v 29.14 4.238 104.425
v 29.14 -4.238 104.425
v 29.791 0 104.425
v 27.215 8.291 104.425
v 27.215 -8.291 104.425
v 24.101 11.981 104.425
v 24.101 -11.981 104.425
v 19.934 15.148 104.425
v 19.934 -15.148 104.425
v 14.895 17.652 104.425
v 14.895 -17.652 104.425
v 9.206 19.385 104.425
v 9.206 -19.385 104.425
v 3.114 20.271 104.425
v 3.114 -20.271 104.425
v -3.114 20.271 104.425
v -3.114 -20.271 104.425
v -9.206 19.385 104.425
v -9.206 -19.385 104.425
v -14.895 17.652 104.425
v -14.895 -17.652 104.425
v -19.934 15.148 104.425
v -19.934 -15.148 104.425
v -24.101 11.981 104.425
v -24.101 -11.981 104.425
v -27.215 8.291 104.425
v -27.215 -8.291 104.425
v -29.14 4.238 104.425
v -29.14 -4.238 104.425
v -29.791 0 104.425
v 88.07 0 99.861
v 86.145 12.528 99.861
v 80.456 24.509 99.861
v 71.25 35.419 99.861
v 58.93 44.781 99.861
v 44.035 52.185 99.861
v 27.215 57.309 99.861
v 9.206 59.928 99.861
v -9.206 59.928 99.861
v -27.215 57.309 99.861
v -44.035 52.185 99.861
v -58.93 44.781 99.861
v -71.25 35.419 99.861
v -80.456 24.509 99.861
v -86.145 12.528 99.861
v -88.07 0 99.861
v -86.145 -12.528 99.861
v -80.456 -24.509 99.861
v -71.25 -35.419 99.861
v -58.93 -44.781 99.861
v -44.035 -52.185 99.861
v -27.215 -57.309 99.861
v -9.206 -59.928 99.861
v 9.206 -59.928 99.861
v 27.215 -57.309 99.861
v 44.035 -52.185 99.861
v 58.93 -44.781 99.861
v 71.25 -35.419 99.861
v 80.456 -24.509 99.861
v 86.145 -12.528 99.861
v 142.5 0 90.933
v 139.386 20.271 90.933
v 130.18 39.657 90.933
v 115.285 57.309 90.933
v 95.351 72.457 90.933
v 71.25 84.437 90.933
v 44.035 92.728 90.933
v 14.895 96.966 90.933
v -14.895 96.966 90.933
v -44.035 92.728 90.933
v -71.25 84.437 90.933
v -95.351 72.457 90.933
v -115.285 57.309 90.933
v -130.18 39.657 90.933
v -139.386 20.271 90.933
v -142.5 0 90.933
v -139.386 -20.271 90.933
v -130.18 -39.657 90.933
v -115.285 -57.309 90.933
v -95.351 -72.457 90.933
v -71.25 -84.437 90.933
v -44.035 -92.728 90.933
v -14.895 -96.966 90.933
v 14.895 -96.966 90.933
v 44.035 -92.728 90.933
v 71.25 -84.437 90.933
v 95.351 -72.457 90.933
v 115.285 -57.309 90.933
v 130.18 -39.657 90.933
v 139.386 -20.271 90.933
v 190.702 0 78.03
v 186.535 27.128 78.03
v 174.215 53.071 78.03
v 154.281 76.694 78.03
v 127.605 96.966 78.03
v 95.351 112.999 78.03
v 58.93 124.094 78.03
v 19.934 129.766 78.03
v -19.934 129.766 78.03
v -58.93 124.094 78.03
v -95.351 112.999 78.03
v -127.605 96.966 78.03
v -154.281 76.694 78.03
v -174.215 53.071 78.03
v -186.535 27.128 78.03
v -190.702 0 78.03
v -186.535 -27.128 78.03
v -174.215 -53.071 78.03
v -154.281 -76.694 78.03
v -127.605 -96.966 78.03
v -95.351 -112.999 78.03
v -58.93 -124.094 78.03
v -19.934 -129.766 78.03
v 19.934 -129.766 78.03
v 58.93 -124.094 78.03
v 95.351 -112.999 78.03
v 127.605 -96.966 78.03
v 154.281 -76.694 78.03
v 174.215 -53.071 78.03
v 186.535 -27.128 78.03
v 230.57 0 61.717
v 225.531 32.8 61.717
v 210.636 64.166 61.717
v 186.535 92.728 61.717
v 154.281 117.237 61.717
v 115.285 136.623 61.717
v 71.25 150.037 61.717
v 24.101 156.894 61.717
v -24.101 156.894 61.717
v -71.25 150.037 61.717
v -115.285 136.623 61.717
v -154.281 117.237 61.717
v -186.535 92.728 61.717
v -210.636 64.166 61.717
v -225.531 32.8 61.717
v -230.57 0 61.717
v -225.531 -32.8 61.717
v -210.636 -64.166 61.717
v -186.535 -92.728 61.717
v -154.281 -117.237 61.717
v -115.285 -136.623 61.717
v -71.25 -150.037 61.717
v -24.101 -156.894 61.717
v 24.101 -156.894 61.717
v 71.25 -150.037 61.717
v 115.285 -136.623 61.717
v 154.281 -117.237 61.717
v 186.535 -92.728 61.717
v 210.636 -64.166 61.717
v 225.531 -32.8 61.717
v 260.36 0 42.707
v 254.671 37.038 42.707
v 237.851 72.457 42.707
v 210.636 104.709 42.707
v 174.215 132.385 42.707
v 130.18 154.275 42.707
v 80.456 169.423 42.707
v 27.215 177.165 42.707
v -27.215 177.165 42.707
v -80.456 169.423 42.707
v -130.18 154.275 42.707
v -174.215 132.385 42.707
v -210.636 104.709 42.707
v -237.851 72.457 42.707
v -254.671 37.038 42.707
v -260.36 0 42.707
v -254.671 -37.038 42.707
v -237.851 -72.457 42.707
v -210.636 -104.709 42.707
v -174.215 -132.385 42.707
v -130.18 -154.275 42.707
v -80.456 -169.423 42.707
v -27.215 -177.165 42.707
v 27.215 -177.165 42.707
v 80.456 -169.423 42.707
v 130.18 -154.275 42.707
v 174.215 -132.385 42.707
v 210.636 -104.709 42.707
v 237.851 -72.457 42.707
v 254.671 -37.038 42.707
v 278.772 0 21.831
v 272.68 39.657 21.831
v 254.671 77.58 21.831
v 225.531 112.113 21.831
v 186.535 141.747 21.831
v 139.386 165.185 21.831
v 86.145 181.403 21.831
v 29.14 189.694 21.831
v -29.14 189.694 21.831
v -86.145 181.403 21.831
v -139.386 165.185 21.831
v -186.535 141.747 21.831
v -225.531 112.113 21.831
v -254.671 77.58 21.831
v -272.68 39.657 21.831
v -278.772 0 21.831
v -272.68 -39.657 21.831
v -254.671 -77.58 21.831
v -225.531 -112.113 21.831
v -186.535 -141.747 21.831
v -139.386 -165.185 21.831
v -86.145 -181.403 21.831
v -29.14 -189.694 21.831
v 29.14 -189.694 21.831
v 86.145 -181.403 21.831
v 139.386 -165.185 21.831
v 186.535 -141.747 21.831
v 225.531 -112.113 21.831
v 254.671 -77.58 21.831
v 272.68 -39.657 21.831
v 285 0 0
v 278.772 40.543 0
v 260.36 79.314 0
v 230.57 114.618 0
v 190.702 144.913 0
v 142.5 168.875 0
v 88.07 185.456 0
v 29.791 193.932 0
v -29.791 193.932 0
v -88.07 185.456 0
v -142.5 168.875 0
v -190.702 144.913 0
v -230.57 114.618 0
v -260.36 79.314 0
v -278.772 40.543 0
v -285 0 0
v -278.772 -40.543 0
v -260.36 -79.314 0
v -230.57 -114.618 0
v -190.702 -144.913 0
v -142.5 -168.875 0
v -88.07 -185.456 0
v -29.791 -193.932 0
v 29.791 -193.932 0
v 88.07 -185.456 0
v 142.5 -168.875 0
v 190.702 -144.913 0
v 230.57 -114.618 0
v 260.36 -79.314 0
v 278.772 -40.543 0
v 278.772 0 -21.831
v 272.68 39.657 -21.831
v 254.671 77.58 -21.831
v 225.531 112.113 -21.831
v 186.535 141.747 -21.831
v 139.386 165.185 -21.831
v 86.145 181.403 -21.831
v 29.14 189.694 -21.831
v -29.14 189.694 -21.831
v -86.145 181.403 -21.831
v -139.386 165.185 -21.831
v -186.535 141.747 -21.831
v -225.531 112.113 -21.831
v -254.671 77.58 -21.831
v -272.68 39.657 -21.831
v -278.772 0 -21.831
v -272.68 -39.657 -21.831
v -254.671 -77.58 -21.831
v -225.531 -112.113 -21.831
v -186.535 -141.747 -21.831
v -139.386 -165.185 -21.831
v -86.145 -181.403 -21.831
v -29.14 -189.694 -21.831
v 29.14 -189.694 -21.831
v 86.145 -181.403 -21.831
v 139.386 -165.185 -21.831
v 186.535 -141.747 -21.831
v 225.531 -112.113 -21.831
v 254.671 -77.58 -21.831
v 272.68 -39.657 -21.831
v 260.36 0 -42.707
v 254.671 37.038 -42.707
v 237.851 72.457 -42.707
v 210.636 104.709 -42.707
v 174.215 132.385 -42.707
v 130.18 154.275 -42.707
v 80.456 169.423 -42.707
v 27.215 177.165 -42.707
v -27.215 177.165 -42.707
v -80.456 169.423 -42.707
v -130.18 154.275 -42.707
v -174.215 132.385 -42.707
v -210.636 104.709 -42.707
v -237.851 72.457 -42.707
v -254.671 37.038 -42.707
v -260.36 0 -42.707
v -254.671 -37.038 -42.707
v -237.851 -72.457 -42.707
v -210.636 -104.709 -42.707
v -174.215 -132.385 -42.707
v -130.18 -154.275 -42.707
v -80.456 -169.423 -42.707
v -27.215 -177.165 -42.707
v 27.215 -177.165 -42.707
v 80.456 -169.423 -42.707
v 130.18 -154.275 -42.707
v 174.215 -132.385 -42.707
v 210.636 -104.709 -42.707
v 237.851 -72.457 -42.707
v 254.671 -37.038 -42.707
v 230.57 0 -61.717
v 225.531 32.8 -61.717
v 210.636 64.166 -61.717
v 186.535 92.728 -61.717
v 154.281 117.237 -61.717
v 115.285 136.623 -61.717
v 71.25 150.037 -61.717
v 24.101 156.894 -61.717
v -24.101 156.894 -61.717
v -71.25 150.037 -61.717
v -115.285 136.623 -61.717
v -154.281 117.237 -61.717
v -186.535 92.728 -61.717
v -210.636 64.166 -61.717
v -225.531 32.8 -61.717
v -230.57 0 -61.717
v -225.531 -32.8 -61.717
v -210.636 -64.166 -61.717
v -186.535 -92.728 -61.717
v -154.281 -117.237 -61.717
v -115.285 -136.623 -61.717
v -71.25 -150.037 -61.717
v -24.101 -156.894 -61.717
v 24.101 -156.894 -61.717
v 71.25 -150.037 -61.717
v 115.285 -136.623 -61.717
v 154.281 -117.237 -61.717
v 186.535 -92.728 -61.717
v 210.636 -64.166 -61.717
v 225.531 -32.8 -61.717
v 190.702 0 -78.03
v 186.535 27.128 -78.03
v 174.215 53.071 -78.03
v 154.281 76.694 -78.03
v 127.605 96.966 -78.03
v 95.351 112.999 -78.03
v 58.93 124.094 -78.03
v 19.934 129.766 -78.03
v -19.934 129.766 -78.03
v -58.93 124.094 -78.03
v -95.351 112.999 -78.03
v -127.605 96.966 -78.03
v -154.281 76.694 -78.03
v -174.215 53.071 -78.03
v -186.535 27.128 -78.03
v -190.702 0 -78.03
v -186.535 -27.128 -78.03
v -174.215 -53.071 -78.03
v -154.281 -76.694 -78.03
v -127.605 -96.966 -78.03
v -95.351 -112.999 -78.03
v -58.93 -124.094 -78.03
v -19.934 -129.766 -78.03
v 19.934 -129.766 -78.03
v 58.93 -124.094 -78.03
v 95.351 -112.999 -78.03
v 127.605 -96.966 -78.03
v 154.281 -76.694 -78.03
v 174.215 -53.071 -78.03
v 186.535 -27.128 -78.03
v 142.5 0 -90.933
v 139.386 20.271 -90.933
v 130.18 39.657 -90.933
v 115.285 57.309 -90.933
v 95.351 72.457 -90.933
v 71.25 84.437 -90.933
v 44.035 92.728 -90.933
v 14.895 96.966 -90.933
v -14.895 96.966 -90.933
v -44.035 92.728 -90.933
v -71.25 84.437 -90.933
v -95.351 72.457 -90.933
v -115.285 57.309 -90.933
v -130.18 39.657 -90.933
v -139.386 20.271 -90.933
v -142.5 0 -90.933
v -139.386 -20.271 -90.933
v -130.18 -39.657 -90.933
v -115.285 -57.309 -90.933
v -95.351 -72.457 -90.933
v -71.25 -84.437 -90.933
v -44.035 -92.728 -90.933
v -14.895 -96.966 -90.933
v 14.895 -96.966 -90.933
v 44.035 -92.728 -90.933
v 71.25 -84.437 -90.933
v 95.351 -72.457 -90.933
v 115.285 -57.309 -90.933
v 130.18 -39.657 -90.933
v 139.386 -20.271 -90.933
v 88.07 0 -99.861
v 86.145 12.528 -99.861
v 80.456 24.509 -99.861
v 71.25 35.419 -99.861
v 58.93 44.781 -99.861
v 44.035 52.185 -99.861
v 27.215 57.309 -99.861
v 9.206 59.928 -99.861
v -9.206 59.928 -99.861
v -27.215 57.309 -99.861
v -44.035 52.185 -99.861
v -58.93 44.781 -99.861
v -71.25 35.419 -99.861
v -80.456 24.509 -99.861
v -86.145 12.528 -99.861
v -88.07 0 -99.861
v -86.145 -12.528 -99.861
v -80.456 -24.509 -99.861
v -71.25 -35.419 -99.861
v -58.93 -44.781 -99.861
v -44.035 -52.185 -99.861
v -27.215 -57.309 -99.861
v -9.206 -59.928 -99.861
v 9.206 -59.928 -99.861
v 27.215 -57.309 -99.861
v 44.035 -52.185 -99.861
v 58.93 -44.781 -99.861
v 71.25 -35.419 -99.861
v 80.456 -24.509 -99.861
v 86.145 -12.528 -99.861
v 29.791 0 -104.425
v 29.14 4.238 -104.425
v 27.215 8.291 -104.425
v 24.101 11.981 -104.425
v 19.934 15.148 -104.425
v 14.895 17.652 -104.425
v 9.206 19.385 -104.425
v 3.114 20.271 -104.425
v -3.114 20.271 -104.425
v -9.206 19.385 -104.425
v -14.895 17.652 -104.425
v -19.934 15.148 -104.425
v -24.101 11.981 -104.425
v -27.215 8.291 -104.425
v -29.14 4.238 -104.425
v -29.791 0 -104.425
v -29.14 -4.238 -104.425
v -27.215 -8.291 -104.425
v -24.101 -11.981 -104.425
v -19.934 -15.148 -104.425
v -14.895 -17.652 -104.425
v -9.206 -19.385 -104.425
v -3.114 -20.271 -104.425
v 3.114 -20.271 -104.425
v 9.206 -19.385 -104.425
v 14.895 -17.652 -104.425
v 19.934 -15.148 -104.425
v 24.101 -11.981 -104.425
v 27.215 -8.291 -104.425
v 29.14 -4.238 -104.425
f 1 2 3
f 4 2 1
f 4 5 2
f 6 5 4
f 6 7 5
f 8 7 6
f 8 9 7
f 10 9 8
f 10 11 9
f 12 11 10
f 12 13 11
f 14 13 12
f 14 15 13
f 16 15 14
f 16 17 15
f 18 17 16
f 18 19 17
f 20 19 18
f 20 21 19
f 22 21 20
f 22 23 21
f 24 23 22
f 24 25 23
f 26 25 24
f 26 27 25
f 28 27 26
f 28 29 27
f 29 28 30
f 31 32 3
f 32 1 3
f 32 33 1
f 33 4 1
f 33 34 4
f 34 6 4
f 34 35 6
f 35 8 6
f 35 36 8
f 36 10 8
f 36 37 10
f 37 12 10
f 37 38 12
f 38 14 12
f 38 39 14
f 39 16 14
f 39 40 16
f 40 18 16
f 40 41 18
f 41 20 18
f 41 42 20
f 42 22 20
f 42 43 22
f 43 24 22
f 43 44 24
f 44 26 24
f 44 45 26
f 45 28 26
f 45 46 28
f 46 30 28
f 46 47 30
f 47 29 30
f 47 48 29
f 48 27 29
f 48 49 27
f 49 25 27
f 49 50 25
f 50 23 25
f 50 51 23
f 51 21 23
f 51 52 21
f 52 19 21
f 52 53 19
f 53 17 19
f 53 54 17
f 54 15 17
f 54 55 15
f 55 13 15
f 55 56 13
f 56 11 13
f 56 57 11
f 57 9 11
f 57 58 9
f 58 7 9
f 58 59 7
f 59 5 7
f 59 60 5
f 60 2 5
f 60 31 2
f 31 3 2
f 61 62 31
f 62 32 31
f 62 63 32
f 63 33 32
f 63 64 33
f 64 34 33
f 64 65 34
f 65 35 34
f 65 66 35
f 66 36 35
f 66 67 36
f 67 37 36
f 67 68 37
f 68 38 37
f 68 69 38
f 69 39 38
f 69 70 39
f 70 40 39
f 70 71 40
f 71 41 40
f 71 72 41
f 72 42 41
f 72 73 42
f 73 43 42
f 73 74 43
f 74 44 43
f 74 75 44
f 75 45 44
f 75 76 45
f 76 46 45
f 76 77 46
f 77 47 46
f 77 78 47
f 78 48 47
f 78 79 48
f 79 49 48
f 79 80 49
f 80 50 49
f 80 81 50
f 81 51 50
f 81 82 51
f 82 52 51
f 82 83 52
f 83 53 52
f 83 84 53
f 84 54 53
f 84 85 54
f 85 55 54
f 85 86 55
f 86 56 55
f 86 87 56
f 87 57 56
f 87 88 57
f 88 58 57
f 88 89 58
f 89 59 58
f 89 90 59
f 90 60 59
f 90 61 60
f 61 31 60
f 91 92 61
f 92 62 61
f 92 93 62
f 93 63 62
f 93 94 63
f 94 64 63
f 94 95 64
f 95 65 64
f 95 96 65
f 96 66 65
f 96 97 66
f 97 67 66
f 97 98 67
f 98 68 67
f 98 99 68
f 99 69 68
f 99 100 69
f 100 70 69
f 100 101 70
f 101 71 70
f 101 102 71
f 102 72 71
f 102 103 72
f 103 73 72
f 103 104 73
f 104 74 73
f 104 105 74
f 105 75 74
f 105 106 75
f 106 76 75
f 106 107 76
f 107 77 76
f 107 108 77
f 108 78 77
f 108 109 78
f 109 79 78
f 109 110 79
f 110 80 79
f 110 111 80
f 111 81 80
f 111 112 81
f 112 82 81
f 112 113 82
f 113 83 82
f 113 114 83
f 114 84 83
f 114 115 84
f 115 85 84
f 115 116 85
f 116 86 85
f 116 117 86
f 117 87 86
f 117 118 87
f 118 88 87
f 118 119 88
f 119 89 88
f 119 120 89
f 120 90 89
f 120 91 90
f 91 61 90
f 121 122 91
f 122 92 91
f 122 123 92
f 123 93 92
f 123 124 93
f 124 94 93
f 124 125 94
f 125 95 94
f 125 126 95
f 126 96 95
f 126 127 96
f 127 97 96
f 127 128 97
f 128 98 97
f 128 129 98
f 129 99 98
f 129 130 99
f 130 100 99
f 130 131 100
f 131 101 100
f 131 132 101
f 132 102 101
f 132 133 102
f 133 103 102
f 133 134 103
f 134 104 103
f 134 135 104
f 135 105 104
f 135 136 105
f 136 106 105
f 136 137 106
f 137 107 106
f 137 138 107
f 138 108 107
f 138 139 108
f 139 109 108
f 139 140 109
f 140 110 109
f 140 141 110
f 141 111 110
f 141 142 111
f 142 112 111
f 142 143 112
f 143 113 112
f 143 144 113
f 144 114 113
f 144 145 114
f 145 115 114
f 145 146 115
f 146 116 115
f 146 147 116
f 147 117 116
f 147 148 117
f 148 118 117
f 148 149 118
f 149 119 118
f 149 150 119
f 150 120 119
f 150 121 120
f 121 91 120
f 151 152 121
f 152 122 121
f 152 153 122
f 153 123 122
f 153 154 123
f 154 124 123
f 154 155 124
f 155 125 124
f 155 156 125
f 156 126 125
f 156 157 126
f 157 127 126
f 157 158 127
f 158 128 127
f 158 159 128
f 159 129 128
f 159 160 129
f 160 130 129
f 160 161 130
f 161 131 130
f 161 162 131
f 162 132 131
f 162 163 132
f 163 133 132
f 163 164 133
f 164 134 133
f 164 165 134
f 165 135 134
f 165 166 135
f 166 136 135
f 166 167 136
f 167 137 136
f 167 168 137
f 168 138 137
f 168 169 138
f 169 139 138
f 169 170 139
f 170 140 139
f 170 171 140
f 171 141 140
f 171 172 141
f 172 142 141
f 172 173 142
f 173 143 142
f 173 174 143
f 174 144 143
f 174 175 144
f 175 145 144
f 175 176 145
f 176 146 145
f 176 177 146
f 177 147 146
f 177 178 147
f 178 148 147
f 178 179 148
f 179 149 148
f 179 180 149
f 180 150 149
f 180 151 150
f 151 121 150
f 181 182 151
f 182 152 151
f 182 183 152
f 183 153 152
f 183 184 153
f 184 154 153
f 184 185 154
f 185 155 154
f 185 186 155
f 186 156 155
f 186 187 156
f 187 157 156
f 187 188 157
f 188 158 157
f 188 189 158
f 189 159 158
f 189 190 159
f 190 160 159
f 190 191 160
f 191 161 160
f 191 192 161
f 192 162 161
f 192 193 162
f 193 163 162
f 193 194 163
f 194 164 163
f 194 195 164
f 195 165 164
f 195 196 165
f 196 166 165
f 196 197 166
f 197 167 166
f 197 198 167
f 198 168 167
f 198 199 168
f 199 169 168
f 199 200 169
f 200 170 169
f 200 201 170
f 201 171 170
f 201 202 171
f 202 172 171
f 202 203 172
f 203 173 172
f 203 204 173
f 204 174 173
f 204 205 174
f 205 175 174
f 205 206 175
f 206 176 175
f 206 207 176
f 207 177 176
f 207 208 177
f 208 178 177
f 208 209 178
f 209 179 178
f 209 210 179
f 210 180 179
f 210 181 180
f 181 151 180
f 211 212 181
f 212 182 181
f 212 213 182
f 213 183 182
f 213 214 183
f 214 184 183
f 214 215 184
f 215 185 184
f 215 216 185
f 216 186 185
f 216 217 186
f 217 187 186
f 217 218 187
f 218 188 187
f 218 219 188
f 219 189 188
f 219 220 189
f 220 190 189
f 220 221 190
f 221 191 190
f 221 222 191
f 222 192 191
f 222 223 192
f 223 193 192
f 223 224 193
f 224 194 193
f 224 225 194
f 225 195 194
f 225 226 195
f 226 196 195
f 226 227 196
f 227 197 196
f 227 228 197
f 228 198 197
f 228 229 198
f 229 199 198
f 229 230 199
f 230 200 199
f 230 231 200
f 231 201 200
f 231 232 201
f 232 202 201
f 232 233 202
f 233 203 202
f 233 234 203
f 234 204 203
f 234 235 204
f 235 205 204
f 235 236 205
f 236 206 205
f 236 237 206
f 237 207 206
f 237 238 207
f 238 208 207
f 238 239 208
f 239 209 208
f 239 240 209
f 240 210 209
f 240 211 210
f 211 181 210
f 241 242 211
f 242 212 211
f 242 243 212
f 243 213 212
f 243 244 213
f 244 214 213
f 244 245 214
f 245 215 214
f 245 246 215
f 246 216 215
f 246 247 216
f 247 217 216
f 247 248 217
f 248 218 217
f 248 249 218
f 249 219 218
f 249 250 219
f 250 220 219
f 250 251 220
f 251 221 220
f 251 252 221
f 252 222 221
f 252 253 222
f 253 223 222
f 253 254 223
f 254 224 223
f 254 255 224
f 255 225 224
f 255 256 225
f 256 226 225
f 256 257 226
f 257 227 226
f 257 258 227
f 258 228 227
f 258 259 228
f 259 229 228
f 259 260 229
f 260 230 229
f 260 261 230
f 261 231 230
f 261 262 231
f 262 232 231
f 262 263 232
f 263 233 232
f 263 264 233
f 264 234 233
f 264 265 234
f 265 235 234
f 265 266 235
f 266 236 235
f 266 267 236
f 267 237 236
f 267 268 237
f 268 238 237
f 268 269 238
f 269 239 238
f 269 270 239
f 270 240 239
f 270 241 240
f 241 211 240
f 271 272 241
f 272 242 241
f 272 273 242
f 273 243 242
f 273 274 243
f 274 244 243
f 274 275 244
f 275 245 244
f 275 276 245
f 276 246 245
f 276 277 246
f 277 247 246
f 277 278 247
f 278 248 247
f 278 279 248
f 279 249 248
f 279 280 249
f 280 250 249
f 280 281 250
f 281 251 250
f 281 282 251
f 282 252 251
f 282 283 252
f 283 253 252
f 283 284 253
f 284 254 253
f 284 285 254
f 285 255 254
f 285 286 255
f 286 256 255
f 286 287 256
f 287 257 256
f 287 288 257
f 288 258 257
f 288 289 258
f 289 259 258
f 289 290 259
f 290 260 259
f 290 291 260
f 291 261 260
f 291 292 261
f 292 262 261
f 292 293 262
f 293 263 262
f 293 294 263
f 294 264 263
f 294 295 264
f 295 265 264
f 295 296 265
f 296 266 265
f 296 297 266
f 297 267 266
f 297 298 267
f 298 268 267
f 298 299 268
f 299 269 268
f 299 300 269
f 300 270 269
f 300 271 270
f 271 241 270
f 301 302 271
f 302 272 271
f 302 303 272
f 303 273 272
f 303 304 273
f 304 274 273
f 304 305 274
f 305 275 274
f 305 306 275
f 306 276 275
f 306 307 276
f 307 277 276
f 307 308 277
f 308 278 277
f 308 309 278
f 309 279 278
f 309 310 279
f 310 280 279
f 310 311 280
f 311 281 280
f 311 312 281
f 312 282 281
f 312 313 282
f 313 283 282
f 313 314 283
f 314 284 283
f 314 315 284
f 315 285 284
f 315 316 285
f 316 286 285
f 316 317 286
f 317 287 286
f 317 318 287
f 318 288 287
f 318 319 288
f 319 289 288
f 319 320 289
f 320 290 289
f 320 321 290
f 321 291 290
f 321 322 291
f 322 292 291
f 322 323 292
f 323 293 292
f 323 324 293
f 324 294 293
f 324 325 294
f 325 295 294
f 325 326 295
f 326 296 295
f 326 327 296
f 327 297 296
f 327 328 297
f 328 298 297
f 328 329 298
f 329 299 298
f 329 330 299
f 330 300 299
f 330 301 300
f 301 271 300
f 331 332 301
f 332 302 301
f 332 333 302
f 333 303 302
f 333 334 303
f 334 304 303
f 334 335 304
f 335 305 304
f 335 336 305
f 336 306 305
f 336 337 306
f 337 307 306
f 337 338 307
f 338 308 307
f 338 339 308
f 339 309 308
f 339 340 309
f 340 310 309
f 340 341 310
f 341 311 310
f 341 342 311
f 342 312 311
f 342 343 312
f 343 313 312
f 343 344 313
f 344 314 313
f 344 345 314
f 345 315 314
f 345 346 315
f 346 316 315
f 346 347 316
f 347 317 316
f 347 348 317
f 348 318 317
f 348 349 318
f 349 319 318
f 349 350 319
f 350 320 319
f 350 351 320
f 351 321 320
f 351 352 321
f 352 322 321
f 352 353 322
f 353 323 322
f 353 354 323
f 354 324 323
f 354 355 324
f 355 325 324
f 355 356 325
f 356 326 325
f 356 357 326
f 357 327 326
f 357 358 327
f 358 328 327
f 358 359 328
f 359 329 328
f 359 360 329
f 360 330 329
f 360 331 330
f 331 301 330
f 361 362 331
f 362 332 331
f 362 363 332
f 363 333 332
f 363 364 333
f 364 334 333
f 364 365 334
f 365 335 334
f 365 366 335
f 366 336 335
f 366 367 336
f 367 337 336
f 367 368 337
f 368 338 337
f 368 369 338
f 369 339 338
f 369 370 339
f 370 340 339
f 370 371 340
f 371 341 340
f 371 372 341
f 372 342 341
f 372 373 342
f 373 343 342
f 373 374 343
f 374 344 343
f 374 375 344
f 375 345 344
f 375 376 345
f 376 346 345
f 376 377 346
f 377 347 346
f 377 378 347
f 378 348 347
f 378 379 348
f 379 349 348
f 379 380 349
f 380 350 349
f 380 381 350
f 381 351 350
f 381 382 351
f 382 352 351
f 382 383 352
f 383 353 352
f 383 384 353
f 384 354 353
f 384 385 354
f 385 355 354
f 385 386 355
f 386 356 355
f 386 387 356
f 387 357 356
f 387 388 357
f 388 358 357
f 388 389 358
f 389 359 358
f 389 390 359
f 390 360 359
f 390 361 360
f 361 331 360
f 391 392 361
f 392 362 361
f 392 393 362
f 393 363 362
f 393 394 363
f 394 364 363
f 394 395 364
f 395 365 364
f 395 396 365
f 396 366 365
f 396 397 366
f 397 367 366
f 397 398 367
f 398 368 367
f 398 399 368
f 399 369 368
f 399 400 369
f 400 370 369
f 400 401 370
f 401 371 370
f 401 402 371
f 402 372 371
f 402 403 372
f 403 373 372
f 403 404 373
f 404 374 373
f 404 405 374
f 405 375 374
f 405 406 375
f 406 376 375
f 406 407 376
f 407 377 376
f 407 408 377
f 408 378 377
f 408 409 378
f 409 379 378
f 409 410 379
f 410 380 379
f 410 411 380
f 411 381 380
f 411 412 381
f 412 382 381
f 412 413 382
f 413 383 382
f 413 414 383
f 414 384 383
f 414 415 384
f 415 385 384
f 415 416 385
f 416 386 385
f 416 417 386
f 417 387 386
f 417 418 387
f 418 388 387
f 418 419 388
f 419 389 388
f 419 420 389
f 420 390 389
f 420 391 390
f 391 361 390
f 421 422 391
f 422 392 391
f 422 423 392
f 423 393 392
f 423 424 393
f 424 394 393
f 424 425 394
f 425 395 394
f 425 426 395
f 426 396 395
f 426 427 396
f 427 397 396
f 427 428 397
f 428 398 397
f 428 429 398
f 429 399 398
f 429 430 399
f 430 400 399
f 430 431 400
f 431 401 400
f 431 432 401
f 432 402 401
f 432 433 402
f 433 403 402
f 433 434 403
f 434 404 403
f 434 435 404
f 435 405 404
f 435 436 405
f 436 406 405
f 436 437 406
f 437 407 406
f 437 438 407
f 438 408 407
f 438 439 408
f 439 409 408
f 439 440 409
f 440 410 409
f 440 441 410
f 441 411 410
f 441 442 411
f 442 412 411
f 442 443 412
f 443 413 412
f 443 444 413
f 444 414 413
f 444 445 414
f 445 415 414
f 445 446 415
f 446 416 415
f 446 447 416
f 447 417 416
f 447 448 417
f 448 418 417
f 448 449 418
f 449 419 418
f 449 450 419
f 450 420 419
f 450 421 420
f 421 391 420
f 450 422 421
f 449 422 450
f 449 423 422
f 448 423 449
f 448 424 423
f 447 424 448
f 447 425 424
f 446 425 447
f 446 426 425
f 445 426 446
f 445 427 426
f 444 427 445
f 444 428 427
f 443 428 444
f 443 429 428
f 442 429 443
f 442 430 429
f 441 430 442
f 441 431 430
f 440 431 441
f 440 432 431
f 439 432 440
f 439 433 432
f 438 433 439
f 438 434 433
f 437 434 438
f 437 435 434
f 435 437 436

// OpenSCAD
// Generated by SolidPython 1.0.1 on 2020-07-29 00:46:54


scale(v = [19, 13, 7]) {
	sphere(r = 15);
}
/***********************************************
*********      SolidPython code:      **********
************************************************
 
# import packages: SolidPython
from solid import *
from solid.utils import *
from itertools import chain, combinations, permutations


class Resize:

    def __init__(self, scad_file):
        self.scad_file = scad_file
        #self.scad_file = import_scad(scad_file)
        # cone/cylinder param:
        self.r1 = 0
        self.r2 = 0
        self.h = 0
        # rectangular prism param:
        self.w = 0
        self.l = 0
        # ellipse param:
        self.r = 0

    # import OpenScad code (file name corresponds to shape)


    # classify shape + parameters
    def assign(self, param1, param2, param3):
        if self.scad_file == 'cone.scad':
            self.r1 = param1
            self.r2 = param2
            self.h = param3
        elif self.scad_file == 'cylinder.scad':
            self.r1 = param1
            self.r2 = param2
            self.h = param3
        elif self.scad_file == 'rectangularPrism.scad':
            self.h = param1
            self.l = param2
            self.w = param3
        else:
            self.r = param1
            self.h = param2

    # resize parameters
    def iterate(self):
        x = range(3, 20, 2)
        i = 1
        if self.scad_file == 'cone.scad':
            tempList = list(permutations(x, 2))
            for temp in tempList:
                param1 = temp[0]
                param2 = temp[1]
                filepath = 'produced_scad_files/' + 'cone' + str(param1) + '_' + str(param2) + '_' + '.scad'
                scad_render_to_file(cylinder(h=param1, r1=param2, r2=0), filepath)

        elif self.scad_file == 'cylinder.scad':
            tempList = list(permutations(x, 3))
            for temp in tempList:
                param1 = temp[0]
                param2 = temp[1]
                filepath = 'produced_scad_files/' + 'cylinder' + str(param1) + '_' + str(param2) + '_' + '.scad'
                scad_render_to_file(cylinder(h=param1, r1=param2, r2=param2), filepath)

        elif self.scad_file == 'rectangularPrism.scad':
            tempList = list(permutations(x, 3))
            for temp in tempList:
                param1 = temp[0]
                param2 = temp[1]
                param3 = temp[2]
                filepath = 'produced_scad_files/' + 'rectangularPrism' + str(param1) + '_' + str(param2) + '_' + str(
                    param3) + '.scad'
                scad_render_to_file(cube(size=(param1, param2, param3)), filepath)

        elif self.scad_file == 'ellipse.scad':
            tempList = list(permutations(x, 4))
            for temp in tempList:
                param1 = temp[0]
                param2 = temp[1]
                param3 = temp[2]
                param4 = temp[3]
                filepath = 'produced_scad_files/' + 'ellipse' + str(param1) + '_' + str(param2) + '_' + str(param3) + '_' + str(param4) + '.scad'
                scad_render_to_file(scale([param1, param2, param3])(sphere(r=param4)), filepath)

    def render_to_scadfile(self):
        scad_render_to_file(scad, 'example.scad') 
 
************************************************/
